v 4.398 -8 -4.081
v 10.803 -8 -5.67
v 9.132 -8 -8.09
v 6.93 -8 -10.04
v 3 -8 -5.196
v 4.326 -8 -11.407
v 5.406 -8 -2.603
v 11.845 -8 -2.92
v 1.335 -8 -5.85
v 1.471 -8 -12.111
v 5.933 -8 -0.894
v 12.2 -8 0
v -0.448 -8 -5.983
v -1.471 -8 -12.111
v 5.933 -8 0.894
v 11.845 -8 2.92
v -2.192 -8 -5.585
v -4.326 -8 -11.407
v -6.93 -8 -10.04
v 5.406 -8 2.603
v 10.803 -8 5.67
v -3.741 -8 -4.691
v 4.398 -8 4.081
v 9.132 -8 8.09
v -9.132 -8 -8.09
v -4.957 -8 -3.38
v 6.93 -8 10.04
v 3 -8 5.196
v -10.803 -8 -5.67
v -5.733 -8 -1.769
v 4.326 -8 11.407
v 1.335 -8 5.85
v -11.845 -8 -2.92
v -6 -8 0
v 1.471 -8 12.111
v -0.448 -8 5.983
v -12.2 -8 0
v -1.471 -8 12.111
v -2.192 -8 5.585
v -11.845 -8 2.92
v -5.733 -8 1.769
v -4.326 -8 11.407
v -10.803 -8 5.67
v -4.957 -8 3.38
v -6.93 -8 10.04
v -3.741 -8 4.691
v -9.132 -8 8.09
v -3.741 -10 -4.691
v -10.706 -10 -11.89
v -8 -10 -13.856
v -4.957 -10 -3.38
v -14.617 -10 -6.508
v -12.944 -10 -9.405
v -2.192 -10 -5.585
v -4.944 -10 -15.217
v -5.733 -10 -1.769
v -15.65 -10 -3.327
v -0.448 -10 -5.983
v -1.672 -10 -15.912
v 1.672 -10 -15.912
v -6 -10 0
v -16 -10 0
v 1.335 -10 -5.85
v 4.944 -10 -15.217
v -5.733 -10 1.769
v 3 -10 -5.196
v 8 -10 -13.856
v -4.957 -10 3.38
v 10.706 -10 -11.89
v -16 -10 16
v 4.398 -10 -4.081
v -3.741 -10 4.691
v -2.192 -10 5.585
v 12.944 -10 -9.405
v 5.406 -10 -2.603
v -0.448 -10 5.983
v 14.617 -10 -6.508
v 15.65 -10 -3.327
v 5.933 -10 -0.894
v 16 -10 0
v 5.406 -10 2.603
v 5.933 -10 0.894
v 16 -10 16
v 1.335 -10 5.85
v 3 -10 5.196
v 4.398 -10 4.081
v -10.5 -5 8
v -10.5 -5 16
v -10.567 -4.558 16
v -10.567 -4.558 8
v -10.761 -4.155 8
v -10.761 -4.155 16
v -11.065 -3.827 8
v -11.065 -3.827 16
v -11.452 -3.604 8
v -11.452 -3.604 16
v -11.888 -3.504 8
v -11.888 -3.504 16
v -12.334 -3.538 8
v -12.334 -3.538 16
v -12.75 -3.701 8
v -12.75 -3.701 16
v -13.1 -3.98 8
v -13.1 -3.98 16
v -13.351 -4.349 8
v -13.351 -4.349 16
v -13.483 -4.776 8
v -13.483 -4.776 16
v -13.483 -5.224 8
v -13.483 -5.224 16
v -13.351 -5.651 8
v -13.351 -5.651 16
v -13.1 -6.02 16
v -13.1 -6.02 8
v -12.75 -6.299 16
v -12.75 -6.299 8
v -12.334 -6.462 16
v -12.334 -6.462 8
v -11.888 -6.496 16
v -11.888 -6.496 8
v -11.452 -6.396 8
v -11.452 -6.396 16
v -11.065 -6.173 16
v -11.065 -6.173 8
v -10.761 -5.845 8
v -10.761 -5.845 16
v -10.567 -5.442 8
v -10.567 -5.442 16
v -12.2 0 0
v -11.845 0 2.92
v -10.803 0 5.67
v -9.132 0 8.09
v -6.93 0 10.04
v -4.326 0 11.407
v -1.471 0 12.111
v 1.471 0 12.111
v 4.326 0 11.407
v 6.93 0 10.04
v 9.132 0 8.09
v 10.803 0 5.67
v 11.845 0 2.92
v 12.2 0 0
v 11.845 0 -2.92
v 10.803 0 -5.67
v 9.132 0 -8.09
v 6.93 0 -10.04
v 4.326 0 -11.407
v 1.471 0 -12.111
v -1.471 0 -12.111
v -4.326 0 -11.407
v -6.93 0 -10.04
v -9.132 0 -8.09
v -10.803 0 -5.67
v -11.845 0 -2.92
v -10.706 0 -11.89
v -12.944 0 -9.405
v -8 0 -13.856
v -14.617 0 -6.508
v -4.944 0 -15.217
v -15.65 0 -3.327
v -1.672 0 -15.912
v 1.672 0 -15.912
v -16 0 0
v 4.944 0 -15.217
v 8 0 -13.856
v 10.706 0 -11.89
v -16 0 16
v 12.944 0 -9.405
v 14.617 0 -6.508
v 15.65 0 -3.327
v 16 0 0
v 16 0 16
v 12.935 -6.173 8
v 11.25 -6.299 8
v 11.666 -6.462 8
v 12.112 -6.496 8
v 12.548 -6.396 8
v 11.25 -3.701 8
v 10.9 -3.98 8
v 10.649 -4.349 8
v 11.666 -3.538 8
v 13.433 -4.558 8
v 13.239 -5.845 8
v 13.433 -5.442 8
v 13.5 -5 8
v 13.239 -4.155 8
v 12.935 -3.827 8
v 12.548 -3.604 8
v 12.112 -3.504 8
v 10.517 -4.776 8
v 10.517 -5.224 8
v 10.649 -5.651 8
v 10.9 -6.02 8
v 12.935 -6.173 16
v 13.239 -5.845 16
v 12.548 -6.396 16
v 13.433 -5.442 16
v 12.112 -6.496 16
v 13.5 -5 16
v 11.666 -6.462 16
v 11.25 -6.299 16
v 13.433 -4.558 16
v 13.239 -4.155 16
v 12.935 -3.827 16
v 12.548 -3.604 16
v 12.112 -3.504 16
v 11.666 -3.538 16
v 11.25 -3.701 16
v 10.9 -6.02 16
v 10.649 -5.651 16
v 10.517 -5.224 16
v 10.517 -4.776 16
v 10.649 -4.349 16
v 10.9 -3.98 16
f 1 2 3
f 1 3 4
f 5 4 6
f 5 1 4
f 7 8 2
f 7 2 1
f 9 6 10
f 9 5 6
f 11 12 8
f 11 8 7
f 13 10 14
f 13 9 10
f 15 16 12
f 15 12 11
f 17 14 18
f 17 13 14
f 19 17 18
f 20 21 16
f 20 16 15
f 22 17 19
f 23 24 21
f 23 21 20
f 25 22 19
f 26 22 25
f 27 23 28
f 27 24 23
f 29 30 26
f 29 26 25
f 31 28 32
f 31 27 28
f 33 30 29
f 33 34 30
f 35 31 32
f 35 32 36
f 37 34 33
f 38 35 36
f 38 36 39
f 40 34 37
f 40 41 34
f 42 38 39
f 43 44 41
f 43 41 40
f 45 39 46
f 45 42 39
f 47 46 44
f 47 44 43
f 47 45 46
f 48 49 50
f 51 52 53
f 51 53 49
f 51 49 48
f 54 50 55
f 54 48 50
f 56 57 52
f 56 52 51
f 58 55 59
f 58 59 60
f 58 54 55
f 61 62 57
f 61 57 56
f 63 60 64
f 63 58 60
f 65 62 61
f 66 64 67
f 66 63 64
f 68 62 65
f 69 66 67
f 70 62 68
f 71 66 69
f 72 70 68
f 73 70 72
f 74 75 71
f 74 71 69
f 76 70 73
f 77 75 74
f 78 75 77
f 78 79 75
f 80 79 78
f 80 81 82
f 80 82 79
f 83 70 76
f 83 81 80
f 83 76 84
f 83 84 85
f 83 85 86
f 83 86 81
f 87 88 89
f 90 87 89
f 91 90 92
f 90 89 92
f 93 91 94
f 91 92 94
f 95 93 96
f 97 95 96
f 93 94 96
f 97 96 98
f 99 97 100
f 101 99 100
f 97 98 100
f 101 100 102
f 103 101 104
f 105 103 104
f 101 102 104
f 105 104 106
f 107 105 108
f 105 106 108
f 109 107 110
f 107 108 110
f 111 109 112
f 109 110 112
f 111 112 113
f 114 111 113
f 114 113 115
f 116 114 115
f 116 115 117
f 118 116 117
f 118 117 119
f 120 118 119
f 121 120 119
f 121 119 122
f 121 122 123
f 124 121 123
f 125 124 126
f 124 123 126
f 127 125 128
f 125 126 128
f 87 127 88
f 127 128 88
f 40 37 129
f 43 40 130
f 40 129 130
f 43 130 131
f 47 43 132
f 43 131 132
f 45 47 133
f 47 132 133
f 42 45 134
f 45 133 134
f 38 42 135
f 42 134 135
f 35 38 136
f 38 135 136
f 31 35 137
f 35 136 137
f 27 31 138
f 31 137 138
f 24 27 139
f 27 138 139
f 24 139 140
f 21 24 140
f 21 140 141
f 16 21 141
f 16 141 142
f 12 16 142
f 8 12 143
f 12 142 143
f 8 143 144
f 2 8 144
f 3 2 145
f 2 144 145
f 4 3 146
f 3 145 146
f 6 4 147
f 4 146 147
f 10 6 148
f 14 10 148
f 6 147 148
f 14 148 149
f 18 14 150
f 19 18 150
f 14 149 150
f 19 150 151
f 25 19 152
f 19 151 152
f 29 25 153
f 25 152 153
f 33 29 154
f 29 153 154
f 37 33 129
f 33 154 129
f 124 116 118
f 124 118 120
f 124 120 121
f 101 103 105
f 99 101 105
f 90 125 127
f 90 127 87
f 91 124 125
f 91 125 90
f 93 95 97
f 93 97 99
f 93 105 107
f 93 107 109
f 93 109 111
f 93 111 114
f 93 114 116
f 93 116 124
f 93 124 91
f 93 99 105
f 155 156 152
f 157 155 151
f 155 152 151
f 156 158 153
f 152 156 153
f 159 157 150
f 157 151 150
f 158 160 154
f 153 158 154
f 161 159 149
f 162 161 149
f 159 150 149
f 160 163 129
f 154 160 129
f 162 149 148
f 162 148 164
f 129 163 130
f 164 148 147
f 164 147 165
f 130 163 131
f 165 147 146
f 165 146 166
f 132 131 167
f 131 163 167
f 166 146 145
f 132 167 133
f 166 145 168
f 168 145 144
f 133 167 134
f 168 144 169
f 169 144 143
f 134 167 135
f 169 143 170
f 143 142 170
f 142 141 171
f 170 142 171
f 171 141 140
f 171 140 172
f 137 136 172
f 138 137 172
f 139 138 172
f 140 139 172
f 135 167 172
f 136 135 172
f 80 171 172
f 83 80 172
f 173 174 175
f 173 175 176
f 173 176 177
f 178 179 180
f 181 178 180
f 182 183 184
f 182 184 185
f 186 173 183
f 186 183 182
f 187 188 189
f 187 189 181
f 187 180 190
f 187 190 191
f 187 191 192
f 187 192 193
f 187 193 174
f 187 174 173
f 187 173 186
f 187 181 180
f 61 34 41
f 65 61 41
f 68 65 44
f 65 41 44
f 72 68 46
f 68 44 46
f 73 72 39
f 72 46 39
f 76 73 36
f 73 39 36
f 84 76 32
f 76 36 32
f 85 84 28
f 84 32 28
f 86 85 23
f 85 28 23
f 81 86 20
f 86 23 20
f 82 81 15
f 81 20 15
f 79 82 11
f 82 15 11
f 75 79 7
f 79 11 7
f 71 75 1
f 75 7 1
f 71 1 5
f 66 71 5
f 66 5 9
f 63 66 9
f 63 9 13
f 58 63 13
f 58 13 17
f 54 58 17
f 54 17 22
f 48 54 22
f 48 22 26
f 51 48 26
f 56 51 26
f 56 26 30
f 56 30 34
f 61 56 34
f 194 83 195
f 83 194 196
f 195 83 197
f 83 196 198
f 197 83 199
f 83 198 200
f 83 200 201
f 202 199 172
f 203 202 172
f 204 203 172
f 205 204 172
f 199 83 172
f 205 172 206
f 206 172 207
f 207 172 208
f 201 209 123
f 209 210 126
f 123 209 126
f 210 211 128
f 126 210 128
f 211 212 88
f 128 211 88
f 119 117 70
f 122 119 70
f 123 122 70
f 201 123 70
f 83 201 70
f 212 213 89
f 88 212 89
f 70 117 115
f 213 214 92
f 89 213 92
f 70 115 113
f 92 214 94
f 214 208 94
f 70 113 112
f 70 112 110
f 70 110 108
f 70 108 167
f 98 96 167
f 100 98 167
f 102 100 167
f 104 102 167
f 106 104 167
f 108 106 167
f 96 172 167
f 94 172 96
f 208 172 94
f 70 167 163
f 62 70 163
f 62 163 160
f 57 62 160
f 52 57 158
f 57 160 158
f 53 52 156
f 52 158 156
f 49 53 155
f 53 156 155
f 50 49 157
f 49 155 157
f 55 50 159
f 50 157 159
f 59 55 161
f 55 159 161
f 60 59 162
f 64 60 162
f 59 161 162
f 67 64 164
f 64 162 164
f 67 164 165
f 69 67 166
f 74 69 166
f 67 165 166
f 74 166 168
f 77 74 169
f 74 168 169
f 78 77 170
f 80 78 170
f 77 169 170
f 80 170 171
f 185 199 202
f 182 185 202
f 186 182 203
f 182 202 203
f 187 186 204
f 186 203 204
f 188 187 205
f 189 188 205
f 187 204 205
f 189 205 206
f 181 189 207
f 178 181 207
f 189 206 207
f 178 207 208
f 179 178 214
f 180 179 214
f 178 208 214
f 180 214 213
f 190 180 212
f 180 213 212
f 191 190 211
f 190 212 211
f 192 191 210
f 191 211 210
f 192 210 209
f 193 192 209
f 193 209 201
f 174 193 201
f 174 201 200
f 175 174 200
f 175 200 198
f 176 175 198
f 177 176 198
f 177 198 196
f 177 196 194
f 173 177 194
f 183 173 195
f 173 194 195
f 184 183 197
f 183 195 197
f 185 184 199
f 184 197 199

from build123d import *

# Parameters (mm, degrees)
F1_DEPTH = 10
F2_R     = 12.2
F3_DEPTH = 8
F4_R     = 6
F5_DEPTH = 25
F6_R     = 1.5
F7_DEPTH = 8


with BuildPart() as f1:
    # F0 (on Front) → F1 (new body)
    with BuildSketch(Plane.XZ):
        with BuildLine():
            Line((16, 0), (-16, 0))
            ThreePointArc((-16, 0), (0, -16), (16, 0))
        make_face()
        with BuildLine():
            Line((-16, 16), (-16, 0))
            ThreePointArc((-16, 0), (-11.3137085183, 11.3137084797), (-5.46e-08, 16))
            Line((-5.46e-08, 16), (-16, 16))
        make_face()
        with BuildLine():
            ThreePointArc((-5.46e-08, 16), (-11.3137085183, 11.3137084797), (-16, 0))
            Line((-16, 0), (16, 0))
            ThreePointArc((16, 0), (11.3137084797, 11.3137085183), (-5.46e-08, 16))
        make_face()
        with BuildLine():
            ThreePointArc((-5.46e-08, 16), (11.3137084797, 11.3137085183), (16, 0))
            Line((16, 0), (16, 16))
            Line((16, 16), (-5.46e-08, 16))
        make_face()
    extrude(amount=F1_DEPTH)

    # F2 (on face) → F3 (cut)
    with BuildSketch(Plane(origin=(0, 0, 0), x_dir=(-1, 0, 0), z_dir=(0, 1, 0))):
        Circle(F2_R)
    extrude(amount=-F3_DEPTH, mode=Mode.SUBTRACT)

    # F4 (on face) → F5 (cut)
    with BuildSketch(Plane(origin=(0, -8, 0), x_dir=(-1, 0, 0), z_dir=(0, 1, 0))):
        Circle(F4_R)
    extrude(amount=-F5_DEPTH, mode=Mode.SUBTRACT)

    # F6 (on face) → F7 (cut)
    with BuildSketch(Plane.XY.offset(16)):
        with Locations((-12, -5)):
            Circle(F6_R)
        with Locations((12, -5)):
            Circle(F6_R)
    extrude(amount=-F7_DEPTH, mode=Mode.SUBTRACT)


solid = f1.part
